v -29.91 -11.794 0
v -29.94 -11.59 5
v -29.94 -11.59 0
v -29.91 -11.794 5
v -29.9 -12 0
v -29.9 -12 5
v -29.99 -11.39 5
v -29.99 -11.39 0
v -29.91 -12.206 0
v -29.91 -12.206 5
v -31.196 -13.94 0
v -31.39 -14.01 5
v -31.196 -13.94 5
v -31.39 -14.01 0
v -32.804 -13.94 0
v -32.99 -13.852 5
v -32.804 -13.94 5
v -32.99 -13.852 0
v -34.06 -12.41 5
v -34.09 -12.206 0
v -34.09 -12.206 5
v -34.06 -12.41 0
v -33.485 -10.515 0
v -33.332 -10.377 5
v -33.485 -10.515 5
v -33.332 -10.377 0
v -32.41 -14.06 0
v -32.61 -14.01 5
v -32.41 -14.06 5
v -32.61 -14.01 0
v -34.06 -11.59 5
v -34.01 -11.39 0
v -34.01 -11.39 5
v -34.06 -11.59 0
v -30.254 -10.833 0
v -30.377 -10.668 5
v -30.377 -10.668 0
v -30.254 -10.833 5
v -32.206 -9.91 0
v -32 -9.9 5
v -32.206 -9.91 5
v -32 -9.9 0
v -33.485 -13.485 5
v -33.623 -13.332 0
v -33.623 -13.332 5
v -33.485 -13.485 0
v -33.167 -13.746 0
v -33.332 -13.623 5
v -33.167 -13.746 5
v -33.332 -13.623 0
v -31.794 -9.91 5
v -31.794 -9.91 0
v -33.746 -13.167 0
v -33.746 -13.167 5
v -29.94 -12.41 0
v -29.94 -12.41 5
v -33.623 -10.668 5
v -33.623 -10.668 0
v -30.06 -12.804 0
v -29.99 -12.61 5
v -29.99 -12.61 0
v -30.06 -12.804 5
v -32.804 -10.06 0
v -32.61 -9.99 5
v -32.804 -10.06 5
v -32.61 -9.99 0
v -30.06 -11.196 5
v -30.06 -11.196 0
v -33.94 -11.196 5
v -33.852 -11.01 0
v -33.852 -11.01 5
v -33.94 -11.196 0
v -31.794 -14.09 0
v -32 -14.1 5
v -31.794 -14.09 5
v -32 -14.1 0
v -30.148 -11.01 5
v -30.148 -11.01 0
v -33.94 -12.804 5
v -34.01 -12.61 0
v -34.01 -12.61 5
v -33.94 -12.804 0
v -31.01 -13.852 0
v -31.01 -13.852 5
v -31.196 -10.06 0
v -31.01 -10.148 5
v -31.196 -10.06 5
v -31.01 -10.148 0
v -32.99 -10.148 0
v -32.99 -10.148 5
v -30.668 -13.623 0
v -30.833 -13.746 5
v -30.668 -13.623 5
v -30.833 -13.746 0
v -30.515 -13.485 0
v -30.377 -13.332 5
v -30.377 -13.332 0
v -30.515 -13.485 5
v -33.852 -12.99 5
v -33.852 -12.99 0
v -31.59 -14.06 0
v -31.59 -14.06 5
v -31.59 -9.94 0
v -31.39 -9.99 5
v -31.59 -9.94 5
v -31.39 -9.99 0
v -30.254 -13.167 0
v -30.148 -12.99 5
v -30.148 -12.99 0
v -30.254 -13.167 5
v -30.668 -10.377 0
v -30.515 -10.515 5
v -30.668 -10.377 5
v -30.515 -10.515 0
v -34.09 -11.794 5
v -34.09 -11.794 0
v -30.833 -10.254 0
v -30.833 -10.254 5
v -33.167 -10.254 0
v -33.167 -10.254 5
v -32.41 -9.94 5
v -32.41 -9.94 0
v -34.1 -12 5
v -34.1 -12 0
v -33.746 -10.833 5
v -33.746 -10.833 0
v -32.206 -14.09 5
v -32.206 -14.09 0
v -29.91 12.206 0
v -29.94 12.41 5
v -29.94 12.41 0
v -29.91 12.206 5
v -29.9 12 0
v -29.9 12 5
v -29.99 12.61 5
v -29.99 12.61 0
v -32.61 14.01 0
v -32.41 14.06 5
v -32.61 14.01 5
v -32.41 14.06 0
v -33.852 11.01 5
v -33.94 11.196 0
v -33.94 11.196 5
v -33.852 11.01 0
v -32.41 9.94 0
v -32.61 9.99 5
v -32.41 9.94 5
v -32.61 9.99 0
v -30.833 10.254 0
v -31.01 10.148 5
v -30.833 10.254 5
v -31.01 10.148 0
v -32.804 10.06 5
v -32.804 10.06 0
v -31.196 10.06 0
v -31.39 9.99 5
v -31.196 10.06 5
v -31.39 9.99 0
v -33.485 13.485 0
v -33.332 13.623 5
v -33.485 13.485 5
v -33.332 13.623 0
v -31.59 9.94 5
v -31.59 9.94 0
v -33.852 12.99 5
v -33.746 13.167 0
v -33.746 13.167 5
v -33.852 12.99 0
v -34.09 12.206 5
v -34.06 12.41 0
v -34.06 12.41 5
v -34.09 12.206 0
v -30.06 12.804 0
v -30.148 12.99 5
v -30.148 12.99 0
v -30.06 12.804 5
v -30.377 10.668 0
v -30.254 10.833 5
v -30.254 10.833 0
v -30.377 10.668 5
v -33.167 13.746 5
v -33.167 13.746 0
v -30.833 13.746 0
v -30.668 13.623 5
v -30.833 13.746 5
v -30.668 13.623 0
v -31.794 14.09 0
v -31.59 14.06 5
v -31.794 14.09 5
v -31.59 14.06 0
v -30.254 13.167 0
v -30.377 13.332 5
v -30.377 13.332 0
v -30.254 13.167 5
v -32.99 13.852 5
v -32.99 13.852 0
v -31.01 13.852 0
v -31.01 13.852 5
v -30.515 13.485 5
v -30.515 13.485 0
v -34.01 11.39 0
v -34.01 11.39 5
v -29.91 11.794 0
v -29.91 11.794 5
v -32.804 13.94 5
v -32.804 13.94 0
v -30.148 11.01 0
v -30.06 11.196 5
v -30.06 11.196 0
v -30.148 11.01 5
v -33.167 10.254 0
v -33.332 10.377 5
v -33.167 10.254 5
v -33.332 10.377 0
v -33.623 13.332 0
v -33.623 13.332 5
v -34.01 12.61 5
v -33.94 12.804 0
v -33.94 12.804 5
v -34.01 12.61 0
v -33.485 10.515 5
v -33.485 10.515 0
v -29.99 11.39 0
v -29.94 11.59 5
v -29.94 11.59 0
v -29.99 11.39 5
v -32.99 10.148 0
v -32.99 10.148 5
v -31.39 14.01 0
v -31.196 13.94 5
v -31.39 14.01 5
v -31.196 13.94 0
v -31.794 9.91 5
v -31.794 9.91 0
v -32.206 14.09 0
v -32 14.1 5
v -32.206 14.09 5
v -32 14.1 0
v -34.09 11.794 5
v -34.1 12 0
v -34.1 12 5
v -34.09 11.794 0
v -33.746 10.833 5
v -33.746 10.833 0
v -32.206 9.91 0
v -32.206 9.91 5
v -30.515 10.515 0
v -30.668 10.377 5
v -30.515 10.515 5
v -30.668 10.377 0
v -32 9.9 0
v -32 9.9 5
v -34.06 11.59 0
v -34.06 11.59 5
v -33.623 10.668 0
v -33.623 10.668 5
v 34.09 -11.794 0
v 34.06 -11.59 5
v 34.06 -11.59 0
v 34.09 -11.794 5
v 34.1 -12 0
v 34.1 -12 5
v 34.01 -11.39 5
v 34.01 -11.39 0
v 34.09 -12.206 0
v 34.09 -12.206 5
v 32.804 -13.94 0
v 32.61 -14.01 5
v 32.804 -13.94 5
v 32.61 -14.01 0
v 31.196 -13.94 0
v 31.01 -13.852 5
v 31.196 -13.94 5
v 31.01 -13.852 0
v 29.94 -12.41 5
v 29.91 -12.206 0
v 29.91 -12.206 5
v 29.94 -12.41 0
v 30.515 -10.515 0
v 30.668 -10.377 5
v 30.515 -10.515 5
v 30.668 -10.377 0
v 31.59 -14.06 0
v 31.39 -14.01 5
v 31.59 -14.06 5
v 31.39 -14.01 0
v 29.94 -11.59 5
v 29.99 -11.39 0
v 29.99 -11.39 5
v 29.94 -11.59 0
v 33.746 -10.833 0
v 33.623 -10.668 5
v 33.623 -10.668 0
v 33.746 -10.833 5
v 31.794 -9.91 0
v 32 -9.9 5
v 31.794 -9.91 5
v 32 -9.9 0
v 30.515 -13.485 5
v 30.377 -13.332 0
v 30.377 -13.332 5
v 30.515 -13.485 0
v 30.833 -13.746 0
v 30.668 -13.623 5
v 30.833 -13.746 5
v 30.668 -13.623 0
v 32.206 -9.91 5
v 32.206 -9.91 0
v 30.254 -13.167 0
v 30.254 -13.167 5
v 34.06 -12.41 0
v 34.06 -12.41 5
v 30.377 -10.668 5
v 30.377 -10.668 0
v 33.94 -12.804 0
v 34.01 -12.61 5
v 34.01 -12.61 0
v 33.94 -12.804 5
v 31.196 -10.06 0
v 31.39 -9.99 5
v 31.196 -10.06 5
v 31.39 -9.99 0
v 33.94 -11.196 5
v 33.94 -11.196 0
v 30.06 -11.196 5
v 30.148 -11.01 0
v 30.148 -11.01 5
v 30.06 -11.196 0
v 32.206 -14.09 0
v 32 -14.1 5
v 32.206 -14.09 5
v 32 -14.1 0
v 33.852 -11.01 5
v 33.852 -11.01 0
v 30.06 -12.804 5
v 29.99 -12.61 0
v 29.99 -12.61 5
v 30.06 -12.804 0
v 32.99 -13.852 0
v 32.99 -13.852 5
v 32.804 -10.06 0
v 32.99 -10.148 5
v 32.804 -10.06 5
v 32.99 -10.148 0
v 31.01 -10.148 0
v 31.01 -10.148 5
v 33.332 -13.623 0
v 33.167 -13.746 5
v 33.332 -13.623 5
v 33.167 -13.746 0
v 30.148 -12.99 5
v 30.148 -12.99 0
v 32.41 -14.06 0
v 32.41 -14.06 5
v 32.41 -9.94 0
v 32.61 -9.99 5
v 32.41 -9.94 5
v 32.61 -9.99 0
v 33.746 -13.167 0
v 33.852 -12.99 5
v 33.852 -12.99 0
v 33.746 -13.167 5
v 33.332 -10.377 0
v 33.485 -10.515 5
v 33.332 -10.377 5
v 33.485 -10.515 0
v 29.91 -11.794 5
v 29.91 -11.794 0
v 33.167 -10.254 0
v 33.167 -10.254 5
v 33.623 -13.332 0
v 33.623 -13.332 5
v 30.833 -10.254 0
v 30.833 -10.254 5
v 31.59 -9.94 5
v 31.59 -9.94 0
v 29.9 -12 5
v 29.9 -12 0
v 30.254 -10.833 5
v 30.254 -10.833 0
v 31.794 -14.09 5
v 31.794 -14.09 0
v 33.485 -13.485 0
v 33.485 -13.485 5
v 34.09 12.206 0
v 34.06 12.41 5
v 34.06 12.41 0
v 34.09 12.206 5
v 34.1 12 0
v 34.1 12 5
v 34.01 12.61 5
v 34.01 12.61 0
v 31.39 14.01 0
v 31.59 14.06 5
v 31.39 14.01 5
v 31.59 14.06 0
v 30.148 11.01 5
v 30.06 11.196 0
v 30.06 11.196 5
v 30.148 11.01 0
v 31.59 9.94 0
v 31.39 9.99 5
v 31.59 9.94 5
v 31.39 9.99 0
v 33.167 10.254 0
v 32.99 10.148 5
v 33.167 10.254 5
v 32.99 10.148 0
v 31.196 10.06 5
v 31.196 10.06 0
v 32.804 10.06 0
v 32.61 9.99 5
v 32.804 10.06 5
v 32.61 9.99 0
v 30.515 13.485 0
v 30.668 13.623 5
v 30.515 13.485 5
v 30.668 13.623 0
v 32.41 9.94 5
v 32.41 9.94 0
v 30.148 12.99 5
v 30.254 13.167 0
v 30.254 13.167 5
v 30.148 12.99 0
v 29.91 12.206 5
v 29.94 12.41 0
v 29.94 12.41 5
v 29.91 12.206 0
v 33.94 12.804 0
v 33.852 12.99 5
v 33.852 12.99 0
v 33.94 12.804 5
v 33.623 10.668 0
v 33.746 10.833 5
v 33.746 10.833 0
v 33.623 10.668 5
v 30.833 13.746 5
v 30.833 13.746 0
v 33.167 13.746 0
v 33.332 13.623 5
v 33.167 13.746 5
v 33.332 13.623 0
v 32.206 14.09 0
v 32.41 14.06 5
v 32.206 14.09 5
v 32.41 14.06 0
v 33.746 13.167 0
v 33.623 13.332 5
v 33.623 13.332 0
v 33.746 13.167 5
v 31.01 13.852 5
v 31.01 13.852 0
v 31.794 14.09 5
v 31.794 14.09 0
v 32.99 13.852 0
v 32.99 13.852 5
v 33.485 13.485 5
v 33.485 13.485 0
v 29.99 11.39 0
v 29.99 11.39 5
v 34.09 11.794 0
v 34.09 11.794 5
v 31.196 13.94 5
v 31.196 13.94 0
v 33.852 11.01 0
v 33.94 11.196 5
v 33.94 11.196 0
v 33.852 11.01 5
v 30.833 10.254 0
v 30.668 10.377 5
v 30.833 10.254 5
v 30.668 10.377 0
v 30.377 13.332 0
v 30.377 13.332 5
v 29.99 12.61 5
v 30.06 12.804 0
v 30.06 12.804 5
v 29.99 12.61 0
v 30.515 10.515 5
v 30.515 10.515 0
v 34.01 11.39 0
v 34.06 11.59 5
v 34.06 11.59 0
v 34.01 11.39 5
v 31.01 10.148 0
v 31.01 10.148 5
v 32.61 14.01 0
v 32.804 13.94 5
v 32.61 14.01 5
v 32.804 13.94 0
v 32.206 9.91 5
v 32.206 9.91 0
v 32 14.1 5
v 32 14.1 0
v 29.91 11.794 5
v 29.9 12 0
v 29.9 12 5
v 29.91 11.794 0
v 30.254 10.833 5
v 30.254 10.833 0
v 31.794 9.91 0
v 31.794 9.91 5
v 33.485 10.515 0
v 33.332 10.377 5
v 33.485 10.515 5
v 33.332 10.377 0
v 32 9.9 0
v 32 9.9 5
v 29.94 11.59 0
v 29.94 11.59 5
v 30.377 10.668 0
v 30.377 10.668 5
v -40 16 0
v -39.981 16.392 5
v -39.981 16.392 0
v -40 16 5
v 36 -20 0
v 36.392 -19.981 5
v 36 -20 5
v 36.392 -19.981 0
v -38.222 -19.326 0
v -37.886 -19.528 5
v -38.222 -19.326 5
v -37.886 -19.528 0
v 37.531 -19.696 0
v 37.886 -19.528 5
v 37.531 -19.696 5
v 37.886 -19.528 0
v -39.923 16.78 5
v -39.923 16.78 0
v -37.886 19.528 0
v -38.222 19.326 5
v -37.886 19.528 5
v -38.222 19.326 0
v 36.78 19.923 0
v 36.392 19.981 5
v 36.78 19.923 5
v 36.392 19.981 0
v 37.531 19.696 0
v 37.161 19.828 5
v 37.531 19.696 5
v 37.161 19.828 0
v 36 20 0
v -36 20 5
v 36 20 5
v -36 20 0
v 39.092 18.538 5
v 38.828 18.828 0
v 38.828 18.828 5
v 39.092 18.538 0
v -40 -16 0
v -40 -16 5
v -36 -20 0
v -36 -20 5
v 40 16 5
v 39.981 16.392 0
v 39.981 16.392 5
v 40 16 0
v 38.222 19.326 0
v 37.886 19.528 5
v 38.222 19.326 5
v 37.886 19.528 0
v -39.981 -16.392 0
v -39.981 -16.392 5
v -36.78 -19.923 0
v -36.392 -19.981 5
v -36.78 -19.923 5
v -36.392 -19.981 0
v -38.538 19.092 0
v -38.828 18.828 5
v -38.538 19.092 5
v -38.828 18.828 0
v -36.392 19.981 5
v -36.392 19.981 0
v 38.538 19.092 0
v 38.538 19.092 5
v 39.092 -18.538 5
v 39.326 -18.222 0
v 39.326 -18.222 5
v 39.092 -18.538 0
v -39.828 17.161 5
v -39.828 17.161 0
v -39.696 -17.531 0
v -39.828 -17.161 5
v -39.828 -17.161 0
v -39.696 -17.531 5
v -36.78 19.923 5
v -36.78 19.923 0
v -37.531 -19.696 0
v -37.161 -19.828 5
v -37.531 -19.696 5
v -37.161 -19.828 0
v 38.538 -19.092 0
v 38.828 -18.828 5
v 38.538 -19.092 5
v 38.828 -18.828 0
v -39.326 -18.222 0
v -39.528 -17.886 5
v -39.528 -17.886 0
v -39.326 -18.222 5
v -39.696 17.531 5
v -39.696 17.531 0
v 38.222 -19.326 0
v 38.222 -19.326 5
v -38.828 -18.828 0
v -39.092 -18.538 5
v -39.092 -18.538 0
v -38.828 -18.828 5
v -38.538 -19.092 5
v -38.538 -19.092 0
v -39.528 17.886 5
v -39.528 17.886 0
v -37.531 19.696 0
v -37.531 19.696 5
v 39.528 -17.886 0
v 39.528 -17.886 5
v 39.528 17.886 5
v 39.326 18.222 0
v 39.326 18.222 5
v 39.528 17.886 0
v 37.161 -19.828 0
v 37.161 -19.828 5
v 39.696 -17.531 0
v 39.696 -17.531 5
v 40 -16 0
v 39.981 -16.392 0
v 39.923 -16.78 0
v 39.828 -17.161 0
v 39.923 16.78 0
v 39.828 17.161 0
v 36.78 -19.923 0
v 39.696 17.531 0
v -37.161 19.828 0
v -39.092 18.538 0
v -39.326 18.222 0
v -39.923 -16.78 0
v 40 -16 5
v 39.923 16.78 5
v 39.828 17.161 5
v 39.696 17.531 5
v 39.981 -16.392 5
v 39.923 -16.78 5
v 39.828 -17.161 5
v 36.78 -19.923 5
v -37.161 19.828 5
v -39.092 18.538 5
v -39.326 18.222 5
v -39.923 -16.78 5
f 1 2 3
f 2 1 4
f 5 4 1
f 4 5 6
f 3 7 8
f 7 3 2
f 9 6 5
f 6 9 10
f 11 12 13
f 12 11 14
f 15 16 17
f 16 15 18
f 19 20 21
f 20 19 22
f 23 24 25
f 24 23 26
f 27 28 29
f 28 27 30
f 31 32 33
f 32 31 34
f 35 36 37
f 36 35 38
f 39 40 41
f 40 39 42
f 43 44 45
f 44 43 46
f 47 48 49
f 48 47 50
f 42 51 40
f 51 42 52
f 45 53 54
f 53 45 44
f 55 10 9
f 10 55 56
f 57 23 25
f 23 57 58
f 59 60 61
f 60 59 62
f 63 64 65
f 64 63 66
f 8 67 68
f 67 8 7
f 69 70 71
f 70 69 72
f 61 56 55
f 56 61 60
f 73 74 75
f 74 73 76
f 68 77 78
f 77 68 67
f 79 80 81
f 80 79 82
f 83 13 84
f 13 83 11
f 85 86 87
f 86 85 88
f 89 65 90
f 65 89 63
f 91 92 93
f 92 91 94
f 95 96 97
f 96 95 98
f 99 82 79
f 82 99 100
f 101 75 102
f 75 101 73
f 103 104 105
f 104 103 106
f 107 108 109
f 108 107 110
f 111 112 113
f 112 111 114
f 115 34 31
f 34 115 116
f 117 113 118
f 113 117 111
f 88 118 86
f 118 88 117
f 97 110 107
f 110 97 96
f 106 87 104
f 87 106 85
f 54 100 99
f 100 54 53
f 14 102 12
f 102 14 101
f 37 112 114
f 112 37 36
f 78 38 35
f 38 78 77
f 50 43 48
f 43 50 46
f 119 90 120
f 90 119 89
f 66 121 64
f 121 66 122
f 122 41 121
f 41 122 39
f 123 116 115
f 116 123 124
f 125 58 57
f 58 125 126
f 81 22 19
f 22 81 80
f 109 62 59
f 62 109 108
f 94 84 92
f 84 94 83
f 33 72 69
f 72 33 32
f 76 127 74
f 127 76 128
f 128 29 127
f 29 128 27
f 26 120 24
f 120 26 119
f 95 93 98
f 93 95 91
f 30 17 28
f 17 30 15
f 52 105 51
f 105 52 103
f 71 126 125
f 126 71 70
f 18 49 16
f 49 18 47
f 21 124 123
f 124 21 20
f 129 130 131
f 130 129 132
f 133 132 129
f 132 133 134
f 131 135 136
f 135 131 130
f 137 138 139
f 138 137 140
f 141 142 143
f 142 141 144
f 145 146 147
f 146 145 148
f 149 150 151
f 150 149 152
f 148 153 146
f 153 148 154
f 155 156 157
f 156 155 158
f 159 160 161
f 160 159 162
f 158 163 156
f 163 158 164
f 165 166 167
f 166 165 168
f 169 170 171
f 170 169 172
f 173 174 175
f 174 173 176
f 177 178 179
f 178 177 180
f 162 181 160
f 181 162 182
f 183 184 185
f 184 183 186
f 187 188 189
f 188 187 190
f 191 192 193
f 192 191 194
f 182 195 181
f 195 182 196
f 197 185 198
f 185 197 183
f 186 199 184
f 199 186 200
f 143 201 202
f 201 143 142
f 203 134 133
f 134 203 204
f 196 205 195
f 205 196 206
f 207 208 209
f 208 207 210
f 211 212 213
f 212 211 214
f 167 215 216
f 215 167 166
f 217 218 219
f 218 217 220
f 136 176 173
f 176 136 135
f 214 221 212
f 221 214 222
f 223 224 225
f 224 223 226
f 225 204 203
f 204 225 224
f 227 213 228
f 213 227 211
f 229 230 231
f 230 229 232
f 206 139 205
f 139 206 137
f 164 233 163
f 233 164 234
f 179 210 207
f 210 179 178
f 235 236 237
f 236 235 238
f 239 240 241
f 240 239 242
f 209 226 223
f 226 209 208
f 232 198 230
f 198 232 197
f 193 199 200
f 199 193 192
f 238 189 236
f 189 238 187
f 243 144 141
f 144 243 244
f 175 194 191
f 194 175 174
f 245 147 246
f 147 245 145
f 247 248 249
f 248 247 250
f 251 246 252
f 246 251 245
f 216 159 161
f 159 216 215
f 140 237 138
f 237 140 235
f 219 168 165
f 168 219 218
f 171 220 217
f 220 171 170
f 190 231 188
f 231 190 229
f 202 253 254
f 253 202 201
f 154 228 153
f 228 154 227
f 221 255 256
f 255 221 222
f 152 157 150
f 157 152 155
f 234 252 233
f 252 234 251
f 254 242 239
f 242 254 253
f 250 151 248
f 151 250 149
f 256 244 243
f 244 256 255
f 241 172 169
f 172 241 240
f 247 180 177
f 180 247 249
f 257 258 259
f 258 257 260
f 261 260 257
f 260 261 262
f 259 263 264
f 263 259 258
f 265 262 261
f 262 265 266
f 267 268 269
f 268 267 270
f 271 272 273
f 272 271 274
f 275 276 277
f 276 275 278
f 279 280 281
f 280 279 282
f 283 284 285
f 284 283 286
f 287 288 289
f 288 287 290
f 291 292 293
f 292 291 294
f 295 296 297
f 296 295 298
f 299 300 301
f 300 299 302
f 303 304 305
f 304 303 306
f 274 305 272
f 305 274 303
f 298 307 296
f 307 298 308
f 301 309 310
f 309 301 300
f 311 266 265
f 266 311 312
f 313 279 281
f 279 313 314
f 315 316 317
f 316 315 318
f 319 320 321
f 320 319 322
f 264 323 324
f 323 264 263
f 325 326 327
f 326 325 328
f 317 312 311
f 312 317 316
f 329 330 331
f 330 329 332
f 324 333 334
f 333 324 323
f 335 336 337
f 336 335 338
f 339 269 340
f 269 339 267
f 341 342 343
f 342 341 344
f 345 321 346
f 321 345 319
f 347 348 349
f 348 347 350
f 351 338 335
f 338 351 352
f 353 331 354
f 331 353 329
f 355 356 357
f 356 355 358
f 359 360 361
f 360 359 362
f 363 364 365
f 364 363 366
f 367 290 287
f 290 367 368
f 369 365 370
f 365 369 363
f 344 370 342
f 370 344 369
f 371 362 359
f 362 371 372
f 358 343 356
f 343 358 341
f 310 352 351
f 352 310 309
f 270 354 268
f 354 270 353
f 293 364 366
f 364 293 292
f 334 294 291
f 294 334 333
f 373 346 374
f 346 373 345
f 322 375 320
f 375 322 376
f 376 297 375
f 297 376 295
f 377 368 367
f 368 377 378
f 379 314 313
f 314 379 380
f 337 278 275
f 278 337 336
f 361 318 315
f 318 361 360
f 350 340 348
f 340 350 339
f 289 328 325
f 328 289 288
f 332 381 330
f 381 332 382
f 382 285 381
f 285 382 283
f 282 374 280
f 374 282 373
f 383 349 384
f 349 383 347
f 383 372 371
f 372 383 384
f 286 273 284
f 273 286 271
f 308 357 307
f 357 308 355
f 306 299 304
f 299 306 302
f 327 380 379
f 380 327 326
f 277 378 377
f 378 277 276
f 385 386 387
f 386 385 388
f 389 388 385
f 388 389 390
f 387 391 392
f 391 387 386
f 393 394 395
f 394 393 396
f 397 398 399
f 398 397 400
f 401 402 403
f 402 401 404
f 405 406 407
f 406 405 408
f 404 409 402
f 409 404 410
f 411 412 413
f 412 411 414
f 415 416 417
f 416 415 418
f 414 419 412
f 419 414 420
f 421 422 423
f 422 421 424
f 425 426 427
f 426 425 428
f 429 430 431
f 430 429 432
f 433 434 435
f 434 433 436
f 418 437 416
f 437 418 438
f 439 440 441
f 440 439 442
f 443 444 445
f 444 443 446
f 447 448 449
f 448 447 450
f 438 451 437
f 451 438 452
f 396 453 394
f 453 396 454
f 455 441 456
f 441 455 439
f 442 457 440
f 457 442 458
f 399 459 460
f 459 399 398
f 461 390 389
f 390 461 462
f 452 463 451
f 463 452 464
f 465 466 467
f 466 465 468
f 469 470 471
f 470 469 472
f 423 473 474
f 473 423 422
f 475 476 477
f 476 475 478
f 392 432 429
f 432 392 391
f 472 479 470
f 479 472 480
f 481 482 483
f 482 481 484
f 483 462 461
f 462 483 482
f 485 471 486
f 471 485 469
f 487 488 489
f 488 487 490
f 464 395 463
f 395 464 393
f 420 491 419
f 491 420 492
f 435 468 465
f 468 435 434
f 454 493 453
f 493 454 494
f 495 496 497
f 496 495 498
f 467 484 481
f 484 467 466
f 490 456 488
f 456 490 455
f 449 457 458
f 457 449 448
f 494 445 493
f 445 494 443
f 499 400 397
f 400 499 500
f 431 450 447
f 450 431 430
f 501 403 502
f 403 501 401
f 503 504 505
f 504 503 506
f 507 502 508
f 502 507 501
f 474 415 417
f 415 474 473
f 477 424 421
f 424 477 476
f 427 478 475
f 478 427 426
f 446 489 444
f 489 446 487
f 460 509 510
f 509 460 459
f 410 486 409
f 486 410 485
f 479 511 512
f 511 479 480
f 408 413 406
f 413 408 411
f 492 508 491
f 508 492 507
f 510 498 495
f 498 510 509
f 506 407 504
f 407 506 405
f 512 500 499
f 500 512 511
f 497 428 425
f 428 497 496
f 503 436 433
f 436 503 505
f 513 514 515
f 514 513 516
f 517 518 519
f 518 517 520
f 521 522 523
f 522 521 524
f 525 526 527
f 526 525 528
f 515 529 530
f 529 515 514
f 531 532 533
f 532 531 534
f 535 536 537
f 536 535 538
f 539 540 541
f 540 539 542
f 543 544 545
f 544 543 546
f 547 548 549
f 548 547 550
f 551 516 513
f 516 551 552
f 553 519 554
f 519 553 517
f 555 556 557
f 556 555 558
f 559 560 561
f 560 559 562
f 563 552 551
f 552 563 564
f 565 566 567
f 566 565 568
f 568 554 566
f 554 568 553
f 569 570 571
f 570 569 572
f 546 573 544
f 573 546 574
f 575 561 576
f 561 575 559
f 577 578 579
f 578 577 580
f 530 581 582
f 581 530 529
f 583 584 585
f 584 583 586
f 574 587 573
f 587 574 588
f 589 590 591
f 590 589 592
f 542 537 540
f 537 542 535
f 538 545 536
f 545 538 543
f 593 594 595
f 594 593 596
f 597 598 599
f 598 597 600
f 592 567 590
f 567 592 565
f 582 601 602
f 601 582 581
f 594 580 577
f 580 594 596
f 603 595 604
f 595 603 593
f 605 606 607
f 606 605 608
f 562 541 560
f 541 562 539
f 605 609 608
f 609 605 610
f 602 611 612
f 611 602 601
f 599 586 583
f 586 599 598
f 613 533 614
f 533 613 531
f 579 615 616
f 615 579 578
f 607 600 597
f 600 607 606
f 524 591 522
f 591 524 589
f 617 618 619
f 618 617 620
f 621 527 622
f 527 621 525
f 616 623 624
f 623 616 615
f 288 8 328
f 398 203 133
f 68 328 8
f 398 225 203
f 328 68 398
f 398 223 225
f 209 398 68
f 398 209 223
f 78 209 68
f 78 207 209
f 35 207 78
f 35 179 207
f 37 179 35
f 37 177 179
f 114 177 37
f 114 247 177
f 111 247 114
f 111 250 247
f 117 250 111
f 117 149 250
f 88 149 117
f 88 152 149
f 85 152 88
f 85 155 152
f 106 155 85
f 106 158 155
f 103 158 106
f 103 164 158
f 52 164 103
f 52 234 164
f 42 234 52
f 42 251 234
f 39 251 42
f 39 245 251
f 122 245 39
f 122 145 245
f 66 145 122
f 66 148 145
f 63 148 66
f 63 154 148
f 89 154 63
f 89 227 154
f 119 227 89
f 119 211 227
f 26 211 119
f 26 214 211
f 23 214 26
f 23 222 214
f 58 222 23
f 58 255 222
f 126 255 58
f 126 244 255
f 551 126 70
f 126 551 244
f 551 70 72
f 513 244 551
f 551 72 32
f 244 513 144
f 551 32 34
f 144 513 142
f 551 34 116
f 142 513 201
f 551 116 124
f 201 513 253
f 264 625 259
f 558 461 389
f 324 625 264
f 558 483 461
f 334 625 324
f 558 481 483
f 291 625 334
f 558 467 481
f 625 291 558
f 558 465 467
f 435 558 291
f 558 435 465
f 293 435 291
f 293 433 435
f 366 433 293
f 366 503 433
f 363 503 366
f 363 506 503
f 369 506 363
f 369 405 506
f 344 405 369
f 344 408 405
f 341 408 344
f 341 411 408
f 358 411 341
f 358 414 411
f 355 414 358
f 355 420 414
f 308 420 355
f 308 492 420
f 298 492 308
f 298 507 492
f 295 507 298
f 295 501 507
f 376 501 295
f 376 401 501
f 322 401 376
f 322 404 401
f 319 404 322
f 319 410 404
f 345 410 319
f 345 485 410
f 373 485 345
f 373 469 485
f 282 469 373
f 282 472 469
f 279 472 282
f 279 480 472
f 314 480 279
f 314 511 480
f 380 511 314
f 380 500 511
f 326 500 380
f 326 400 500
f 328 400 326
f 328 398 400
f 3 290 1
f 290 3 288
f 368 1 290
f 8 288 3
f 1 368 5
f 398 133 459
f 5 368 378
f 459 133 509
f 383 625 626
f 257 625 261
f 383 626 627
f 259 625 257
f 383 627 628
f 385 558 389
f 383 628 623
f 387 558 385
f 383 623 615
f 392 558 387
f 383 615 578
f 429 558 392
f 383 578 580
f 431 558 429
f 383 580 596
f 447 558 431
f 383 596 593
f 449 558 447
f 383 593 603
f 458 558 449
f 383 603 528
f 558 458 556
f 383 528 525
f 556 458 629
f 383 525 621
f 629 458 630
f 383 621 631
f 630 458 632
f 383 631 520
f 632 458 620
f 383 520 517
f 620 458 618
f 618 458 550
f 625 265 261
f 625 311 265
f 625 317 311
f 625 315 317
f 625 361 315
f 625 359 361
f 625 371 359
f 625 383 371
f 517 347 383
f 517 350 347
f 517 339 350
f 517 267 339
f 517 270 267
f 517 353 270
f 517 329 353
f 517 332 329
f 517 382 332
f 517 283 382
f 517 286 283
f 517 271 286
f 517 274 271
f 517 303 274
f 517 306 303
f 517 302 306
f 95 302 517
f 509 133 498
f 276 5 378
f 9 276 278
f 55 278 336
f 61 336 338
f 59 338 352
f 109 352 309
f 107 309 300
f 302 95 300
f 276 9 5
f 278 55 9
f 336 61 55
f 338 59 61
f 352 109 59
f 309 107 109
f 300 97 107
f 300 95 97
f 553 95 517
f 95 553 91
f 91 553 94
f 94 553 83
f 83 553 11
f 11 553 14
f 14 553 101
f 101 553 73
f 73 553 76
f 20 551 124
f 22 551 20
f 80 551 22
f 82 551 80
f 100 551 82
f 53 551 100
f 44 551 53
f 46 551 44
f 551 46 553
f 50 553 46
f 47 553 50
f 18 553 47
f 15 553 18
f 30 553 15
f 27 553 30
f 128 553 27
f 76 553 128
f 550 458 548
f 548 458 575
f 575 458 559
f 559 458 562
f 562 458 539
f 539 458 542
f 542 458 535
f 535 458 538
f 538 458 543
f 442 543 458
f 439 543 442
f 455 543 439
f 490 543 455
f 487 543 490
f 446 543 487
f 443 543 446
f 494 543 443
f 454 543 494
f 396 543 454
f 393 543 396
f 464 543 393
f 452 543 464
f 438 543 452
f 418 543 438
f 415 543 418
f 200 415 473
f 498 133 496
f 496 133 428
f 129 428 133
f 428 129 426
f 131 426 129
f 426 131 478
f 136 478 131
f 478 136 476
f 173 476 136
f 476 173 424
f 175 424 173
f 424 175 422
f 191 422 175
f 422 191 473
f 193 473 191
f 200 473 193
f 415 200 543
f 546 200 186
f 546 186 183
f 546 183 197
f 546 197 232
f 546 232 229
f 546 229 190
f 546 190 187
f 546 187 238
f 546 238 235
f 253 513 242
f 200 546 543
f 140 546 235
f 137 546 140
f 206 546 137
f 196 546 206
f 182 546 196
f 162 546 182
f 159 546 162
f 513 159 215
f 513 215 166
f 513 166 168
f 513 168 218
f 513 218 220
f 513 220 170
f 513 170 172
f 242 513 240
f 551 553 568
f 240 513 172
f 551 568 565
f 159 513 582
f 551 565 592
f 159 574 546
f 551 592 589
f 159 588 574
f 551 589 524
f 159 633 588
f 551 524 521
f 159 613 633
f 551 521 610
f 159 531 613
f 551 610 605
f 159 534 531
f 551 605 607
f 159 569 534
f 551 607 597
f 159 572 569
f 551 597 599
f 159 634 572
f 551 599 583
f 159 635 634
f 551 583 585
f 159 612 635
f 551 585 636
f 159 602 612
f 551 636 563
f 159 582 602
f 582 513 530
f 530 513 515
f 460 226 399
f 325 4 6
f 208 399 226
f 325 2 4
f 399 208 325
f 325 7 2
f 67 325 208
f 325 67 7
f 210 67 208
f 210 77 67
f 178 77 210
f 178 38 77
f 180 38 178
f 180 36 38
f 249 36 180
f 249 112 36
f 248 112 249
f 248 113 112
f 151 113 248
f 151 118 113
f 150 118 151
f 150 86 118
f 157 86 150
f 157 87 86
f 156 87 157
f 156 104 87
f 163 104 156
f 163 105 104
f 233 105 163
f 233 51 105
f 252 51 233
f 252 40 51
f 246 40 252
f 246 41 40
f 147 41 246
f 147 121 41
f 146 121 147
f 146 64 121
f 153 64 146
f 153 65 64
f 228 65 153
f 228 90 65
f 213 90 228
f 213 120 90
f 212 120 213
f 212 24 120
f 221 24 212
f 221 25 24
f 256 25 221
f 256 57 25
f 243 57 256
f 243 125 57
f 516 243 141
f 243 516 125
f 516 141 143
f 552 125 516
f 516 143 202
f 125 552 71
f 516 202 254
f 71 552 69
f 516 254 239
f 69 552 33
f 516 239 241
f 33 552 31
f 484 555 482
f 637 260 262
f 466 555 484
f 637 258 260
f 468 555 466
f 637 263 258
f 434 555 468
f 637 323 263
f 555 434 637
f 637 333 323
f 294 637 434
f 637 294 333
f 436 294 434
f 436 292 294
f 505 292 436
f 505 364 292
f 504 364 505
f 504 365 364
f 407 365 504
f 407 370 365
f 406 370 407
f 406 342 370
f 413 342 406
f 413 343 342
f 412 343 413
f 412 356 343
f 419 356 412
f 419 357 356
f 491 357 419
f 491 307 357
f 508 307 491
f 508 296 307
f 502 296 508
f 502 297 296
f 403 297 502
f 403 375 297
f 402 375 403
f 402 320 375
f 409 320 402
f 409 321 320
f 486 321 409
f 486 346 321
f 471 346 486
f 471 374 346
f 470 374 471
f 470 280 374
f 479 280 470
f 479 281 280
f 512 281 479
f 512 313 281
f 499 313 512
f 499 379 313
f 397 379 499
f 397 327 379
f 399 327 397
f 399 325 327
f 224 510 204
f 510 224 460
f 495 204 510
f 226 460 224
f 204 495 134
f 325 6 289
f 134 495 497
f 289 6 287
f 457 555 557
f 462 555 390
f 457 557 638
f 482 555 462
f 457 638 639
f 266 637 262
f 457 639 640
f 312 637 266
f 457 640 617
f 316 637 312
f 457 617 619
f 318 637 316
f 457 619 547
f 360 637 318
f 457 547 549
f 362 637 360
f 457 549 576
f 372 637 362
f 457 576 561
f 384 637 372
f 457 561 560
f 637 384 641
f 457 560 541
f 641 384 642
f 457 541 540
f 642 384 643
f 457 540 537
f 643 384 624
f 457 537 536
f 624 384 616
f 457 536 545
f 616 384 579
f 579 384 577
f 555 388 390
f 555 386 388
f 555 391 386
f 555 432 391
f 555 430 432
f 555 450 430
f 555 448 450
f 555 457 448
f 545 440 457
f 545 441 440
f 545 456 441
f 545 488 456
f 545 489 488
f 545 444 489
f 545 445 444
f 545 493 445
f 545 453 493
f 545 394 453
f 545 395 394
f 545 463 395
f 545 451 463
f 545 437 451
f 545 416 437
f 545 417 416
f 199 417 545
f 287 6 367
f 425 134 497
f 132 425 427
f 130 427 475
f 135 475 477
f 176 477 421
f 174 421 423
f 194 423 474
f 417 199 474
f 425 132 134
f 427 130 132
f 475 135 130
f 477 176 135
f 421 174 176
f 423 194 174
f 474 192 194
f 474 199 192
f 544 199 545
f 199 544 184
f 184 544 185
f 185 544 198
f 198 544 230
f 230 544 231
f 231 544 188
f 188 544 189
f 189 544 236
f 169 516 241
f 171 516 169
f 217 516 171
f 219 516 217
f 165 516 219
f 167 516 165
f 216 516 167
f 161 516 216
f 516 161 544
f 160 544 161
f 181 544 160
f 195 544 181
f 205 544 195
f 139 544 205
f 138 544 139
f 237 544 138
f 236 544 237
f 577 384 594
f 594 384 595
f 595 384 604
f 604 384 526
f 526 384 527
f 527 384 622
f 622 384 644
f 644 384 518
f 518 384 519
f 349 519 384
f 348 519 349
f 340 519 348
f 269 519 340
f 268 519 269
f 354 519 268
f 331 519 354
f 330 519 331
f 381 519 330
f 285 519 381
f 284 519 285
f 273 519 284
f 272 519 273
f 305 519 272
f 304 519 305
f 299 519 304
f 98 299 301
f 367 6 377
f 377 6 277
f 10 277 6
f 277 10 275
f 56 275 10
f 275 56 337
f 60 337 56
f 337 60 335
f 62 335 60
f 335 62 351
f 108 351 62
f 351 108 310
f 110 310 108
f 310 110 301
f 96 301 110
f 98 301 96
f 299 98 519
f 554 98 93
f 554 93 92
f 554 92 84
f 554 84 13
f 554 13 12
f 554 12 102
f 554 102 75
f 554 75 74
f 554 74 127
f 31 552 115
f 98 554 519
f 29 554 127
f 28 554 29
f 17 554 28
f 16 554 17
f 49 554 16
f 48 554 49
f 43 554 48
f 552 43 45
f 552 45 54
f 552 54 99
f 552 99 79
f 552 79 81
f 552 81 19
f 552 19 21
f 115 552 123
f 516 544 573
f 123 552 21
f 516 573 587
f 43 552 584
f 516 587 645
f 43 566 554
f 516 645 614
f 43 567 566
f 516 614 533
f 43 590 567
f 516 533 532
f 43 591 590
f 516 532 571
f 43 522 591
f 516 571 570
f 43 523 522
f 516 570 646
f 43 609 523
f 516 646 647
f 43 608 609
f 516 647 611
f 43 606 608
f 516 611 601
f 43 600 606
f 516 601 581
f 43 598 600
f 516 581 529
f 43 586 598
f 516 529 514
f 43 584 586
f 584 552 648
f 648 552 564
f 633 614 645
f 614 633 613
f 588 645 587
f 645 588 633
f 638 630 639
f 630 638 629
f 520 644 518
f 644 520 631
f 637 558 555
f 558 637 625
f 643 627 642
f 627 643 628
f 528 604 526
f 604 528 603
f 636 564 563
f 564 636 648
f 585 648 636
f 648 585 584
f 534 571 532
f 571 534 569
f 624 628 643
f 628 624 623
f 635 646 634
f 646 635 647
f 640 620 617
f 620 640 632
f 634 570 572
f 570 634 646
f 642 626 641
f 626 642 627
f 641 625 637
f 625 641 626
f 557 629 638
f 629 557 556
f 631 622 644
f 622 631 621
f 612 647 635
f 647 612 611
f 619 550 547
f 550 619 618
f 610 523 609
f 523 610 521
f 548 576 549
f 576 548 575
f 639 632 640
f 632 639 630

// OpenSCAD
/*
Model: Rounded mounting plate with four through holes
Units: millimetres
Export: Render (F6), then export STL/3MF
*/

/* [Dimensions] */
plate_w = 80; // [20:1:200]
plate_d = 40; // [20:1:200]
plate_t = 5; // [1:0.5:30]
corner_r = 4; // [0:0.5:20]

/* [Holes] */
hole_d = 4.2; // [1:0.1:20]
hole_inset = 8; // [3:0.5:40]

/* [Hidden] */
eps = 0.01;
$fn = 64;

safe_corner_r = min(corner_r, min(plate_w, plate_d) / 2 - eps);

assert(plate_w > 0, "plate_w must be positive");
assert(plate_d > 0, "plate_d must be positive");
assert(plate_t > 0, "plate_t must be positive");
assert(hole_d > 0, "hole_d must be positive");
assert(hole_inset > hole_d / 2, "hole_inset must keep holes inside plate");
assert(plate_w > 2 * hole_inset, "plate_w too small for hole_inset");
assert(plate_d > 2 * hole_inset, "plate_d too small for hole_inset");
assert(safe_corner_r >= 0, "corner_r too large for plate dimensions");

module rounded_rect_2d(w, d, r) {
    if (r <= eps)
        square([w, d], center = true);
    else
        offset(r = r)
            offset(delta = -r)
                square([w, d], center = true);
}

module plate_body() {
    linear_extrude(height = plate_t)
        rounded_rect_2d(plate_w, plate_d, safe_corner_r);
}

module four_corner_positions() {
    for (x = [-plate_w / 2 + hole_inset, plate_w / 2 - hole_inset])
    for (y = [-plate_d / 2 + hole_inset, plate_d / 2 - hole_inset])
        translate([x, y, 0])
            children();
}

module hole_cutters() {
    four_corner_positions()
        translate([0, 0, -eps])
            cylinder(h = plate_t + 2 * eps, d = hole_d);
}

module model() {
    difference() {
        plate_body();
        hole_cutters();
    }
}

model();
